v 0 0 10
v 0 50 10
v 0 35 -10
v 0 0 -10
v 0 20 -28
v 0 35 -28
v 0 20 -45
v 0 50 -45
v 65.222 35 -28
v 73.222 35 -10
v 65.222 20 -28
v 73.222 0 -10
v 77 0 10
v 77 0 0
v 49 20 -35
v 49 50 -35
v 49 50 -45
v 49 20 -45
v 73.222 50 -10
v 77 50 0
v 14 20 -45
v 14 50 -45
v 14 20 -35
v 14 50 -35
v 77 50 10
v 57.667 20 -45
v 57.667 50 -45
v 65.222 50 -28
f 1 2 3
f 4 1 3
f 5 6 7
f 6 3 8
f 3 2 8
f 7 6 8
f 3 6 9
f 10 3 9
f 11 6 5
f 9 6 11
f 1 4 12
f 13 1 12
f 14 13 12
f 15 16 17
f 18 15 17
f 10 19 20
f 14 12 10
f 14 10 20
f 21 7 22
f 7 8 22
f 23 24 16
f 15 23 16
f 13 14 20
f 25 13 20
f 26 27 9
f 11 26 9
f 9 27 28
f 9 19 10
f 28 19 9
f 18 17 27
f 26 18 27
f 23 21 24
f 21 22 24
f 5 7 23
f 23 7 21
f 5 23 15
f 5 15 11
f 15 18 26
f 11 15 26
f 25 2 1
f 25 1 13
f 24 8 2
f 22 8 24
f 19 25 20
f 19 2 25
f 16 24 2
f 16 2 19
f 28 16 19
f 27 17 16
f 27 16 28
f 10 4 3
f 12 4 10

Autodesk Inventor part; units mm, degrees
ref_plane "YZ Plane" through (0, 0, 0) normal (1, 0, 0) x (0, 1, 0)
ref_plane "XZ Plane" through (0, 0, 0) normal (0, 1, 0) x (-1, 0, 0)
ref_plane "XY Plane" through (0, 0, 0) normal (0, 0, 1) x (1, 0, 0)
sketch "Szkic1" plane through (0, 0, 0) normal (0, 0, 1) x (1, 0, 0)
  line L0 (0, 0) -> (77, 0)
  line L1 (77, 0) -> (77, 50)
  line L2 (77, 50) -> (0, 50)
  line L3 (0, 50) -> (0, 0)
  dimension "d0" = 77
  dimension "d1" = 50
extrude "Wyciągnięcie proste1" add sketch "Szkic1" along normal blind 10
sketch "Szkic2" plane through (0, 0, 0) normal (0, -1, 0) x (1, 0, 0)
  line L0 (77, 0) -> (0, 0) projected
  line L1 (0, 0) -> (77, 0)
  line L2 (77, 0) -> (0, 0)
  line L3 (0, 0) -> (0, -10)
  line L4 (0, -10) -> (73.2222, -10)
  line L5 (77, 0) -> (0, 0)
  line L6 (73.2222, -10) -> (77, 0)
  dimension "d6" = 10
extrude "Wyciągnięcie proste2" add sketch "Szkic2" against normal blind 50
sketch "Szkic3" plane through (0, 50, 10) normal (0, 1, 0) x (1, 0, 0)
  line L0 (0, 20) -> (0, 0) projected
  line L1 (0, 20) -> (0, 38)
  line L2 (77, 10) -> (73.2222, 20) projected
  line L3 (73.2222, 20) -> (66.4222, 38)
  line L4 (66.4222, 38) -> (0, 38)
  point P0 (0, 10)
  dimension "d9" = 18
sketch "Szkic4" plane through (0, 50, 10) normal (0, 1, 0) x (1, 0, 0)
  line L0 (0, 20) -> (0, 0) projected
  line L1 (0, 20) -> (0, 38)
  line L2 (73.2222, 20) -> (0, 20) projected
  line L3 (0, 20) -> (73.2222, 20)
  line L4 (73.2222, 20) -> (65.2222, 38)
  line L5 (65.2222, 38) -> (0, 38)
  point P0 (0, 10)
  dimension "d10" = 18
extrude "Wyciągnięcie proste3" add sketch "Szkic4" against normal blind 15
sketch "Szkic5" plane through (0, 50, 10) normal (0, 1, 0) x (1, 0, 0)
  line L0 (0, 38) -> (65.2222, 38) projected
  line L1 (0, 38) -> (0, 55)
  line L2 (0, 38) -> (65.2222, 38)
  line L3 (65.2222, 38) -> (73.2222, 20) projected
  line L4 (57.6666, 55) -> (65.2222, 38)
  line L5 (0, 55) -> (14, 55)
  line L6 (14, 55) -> (14, 45)
  line L7 (14, 45) -> (49, 45)
  line L8 (49, 45) -> (49, 55)
  line L9 (49, 55) -> (57.6666, 55)
  point P0 (0, 10)
  dimension "d13" = 17
  dimension "d14" = 14
  dimension "d15" = 10
  dimension "d16" = 35
extrude "Wyciągnięcie proste4" add sketch "Szkic5" against normal blind 30
